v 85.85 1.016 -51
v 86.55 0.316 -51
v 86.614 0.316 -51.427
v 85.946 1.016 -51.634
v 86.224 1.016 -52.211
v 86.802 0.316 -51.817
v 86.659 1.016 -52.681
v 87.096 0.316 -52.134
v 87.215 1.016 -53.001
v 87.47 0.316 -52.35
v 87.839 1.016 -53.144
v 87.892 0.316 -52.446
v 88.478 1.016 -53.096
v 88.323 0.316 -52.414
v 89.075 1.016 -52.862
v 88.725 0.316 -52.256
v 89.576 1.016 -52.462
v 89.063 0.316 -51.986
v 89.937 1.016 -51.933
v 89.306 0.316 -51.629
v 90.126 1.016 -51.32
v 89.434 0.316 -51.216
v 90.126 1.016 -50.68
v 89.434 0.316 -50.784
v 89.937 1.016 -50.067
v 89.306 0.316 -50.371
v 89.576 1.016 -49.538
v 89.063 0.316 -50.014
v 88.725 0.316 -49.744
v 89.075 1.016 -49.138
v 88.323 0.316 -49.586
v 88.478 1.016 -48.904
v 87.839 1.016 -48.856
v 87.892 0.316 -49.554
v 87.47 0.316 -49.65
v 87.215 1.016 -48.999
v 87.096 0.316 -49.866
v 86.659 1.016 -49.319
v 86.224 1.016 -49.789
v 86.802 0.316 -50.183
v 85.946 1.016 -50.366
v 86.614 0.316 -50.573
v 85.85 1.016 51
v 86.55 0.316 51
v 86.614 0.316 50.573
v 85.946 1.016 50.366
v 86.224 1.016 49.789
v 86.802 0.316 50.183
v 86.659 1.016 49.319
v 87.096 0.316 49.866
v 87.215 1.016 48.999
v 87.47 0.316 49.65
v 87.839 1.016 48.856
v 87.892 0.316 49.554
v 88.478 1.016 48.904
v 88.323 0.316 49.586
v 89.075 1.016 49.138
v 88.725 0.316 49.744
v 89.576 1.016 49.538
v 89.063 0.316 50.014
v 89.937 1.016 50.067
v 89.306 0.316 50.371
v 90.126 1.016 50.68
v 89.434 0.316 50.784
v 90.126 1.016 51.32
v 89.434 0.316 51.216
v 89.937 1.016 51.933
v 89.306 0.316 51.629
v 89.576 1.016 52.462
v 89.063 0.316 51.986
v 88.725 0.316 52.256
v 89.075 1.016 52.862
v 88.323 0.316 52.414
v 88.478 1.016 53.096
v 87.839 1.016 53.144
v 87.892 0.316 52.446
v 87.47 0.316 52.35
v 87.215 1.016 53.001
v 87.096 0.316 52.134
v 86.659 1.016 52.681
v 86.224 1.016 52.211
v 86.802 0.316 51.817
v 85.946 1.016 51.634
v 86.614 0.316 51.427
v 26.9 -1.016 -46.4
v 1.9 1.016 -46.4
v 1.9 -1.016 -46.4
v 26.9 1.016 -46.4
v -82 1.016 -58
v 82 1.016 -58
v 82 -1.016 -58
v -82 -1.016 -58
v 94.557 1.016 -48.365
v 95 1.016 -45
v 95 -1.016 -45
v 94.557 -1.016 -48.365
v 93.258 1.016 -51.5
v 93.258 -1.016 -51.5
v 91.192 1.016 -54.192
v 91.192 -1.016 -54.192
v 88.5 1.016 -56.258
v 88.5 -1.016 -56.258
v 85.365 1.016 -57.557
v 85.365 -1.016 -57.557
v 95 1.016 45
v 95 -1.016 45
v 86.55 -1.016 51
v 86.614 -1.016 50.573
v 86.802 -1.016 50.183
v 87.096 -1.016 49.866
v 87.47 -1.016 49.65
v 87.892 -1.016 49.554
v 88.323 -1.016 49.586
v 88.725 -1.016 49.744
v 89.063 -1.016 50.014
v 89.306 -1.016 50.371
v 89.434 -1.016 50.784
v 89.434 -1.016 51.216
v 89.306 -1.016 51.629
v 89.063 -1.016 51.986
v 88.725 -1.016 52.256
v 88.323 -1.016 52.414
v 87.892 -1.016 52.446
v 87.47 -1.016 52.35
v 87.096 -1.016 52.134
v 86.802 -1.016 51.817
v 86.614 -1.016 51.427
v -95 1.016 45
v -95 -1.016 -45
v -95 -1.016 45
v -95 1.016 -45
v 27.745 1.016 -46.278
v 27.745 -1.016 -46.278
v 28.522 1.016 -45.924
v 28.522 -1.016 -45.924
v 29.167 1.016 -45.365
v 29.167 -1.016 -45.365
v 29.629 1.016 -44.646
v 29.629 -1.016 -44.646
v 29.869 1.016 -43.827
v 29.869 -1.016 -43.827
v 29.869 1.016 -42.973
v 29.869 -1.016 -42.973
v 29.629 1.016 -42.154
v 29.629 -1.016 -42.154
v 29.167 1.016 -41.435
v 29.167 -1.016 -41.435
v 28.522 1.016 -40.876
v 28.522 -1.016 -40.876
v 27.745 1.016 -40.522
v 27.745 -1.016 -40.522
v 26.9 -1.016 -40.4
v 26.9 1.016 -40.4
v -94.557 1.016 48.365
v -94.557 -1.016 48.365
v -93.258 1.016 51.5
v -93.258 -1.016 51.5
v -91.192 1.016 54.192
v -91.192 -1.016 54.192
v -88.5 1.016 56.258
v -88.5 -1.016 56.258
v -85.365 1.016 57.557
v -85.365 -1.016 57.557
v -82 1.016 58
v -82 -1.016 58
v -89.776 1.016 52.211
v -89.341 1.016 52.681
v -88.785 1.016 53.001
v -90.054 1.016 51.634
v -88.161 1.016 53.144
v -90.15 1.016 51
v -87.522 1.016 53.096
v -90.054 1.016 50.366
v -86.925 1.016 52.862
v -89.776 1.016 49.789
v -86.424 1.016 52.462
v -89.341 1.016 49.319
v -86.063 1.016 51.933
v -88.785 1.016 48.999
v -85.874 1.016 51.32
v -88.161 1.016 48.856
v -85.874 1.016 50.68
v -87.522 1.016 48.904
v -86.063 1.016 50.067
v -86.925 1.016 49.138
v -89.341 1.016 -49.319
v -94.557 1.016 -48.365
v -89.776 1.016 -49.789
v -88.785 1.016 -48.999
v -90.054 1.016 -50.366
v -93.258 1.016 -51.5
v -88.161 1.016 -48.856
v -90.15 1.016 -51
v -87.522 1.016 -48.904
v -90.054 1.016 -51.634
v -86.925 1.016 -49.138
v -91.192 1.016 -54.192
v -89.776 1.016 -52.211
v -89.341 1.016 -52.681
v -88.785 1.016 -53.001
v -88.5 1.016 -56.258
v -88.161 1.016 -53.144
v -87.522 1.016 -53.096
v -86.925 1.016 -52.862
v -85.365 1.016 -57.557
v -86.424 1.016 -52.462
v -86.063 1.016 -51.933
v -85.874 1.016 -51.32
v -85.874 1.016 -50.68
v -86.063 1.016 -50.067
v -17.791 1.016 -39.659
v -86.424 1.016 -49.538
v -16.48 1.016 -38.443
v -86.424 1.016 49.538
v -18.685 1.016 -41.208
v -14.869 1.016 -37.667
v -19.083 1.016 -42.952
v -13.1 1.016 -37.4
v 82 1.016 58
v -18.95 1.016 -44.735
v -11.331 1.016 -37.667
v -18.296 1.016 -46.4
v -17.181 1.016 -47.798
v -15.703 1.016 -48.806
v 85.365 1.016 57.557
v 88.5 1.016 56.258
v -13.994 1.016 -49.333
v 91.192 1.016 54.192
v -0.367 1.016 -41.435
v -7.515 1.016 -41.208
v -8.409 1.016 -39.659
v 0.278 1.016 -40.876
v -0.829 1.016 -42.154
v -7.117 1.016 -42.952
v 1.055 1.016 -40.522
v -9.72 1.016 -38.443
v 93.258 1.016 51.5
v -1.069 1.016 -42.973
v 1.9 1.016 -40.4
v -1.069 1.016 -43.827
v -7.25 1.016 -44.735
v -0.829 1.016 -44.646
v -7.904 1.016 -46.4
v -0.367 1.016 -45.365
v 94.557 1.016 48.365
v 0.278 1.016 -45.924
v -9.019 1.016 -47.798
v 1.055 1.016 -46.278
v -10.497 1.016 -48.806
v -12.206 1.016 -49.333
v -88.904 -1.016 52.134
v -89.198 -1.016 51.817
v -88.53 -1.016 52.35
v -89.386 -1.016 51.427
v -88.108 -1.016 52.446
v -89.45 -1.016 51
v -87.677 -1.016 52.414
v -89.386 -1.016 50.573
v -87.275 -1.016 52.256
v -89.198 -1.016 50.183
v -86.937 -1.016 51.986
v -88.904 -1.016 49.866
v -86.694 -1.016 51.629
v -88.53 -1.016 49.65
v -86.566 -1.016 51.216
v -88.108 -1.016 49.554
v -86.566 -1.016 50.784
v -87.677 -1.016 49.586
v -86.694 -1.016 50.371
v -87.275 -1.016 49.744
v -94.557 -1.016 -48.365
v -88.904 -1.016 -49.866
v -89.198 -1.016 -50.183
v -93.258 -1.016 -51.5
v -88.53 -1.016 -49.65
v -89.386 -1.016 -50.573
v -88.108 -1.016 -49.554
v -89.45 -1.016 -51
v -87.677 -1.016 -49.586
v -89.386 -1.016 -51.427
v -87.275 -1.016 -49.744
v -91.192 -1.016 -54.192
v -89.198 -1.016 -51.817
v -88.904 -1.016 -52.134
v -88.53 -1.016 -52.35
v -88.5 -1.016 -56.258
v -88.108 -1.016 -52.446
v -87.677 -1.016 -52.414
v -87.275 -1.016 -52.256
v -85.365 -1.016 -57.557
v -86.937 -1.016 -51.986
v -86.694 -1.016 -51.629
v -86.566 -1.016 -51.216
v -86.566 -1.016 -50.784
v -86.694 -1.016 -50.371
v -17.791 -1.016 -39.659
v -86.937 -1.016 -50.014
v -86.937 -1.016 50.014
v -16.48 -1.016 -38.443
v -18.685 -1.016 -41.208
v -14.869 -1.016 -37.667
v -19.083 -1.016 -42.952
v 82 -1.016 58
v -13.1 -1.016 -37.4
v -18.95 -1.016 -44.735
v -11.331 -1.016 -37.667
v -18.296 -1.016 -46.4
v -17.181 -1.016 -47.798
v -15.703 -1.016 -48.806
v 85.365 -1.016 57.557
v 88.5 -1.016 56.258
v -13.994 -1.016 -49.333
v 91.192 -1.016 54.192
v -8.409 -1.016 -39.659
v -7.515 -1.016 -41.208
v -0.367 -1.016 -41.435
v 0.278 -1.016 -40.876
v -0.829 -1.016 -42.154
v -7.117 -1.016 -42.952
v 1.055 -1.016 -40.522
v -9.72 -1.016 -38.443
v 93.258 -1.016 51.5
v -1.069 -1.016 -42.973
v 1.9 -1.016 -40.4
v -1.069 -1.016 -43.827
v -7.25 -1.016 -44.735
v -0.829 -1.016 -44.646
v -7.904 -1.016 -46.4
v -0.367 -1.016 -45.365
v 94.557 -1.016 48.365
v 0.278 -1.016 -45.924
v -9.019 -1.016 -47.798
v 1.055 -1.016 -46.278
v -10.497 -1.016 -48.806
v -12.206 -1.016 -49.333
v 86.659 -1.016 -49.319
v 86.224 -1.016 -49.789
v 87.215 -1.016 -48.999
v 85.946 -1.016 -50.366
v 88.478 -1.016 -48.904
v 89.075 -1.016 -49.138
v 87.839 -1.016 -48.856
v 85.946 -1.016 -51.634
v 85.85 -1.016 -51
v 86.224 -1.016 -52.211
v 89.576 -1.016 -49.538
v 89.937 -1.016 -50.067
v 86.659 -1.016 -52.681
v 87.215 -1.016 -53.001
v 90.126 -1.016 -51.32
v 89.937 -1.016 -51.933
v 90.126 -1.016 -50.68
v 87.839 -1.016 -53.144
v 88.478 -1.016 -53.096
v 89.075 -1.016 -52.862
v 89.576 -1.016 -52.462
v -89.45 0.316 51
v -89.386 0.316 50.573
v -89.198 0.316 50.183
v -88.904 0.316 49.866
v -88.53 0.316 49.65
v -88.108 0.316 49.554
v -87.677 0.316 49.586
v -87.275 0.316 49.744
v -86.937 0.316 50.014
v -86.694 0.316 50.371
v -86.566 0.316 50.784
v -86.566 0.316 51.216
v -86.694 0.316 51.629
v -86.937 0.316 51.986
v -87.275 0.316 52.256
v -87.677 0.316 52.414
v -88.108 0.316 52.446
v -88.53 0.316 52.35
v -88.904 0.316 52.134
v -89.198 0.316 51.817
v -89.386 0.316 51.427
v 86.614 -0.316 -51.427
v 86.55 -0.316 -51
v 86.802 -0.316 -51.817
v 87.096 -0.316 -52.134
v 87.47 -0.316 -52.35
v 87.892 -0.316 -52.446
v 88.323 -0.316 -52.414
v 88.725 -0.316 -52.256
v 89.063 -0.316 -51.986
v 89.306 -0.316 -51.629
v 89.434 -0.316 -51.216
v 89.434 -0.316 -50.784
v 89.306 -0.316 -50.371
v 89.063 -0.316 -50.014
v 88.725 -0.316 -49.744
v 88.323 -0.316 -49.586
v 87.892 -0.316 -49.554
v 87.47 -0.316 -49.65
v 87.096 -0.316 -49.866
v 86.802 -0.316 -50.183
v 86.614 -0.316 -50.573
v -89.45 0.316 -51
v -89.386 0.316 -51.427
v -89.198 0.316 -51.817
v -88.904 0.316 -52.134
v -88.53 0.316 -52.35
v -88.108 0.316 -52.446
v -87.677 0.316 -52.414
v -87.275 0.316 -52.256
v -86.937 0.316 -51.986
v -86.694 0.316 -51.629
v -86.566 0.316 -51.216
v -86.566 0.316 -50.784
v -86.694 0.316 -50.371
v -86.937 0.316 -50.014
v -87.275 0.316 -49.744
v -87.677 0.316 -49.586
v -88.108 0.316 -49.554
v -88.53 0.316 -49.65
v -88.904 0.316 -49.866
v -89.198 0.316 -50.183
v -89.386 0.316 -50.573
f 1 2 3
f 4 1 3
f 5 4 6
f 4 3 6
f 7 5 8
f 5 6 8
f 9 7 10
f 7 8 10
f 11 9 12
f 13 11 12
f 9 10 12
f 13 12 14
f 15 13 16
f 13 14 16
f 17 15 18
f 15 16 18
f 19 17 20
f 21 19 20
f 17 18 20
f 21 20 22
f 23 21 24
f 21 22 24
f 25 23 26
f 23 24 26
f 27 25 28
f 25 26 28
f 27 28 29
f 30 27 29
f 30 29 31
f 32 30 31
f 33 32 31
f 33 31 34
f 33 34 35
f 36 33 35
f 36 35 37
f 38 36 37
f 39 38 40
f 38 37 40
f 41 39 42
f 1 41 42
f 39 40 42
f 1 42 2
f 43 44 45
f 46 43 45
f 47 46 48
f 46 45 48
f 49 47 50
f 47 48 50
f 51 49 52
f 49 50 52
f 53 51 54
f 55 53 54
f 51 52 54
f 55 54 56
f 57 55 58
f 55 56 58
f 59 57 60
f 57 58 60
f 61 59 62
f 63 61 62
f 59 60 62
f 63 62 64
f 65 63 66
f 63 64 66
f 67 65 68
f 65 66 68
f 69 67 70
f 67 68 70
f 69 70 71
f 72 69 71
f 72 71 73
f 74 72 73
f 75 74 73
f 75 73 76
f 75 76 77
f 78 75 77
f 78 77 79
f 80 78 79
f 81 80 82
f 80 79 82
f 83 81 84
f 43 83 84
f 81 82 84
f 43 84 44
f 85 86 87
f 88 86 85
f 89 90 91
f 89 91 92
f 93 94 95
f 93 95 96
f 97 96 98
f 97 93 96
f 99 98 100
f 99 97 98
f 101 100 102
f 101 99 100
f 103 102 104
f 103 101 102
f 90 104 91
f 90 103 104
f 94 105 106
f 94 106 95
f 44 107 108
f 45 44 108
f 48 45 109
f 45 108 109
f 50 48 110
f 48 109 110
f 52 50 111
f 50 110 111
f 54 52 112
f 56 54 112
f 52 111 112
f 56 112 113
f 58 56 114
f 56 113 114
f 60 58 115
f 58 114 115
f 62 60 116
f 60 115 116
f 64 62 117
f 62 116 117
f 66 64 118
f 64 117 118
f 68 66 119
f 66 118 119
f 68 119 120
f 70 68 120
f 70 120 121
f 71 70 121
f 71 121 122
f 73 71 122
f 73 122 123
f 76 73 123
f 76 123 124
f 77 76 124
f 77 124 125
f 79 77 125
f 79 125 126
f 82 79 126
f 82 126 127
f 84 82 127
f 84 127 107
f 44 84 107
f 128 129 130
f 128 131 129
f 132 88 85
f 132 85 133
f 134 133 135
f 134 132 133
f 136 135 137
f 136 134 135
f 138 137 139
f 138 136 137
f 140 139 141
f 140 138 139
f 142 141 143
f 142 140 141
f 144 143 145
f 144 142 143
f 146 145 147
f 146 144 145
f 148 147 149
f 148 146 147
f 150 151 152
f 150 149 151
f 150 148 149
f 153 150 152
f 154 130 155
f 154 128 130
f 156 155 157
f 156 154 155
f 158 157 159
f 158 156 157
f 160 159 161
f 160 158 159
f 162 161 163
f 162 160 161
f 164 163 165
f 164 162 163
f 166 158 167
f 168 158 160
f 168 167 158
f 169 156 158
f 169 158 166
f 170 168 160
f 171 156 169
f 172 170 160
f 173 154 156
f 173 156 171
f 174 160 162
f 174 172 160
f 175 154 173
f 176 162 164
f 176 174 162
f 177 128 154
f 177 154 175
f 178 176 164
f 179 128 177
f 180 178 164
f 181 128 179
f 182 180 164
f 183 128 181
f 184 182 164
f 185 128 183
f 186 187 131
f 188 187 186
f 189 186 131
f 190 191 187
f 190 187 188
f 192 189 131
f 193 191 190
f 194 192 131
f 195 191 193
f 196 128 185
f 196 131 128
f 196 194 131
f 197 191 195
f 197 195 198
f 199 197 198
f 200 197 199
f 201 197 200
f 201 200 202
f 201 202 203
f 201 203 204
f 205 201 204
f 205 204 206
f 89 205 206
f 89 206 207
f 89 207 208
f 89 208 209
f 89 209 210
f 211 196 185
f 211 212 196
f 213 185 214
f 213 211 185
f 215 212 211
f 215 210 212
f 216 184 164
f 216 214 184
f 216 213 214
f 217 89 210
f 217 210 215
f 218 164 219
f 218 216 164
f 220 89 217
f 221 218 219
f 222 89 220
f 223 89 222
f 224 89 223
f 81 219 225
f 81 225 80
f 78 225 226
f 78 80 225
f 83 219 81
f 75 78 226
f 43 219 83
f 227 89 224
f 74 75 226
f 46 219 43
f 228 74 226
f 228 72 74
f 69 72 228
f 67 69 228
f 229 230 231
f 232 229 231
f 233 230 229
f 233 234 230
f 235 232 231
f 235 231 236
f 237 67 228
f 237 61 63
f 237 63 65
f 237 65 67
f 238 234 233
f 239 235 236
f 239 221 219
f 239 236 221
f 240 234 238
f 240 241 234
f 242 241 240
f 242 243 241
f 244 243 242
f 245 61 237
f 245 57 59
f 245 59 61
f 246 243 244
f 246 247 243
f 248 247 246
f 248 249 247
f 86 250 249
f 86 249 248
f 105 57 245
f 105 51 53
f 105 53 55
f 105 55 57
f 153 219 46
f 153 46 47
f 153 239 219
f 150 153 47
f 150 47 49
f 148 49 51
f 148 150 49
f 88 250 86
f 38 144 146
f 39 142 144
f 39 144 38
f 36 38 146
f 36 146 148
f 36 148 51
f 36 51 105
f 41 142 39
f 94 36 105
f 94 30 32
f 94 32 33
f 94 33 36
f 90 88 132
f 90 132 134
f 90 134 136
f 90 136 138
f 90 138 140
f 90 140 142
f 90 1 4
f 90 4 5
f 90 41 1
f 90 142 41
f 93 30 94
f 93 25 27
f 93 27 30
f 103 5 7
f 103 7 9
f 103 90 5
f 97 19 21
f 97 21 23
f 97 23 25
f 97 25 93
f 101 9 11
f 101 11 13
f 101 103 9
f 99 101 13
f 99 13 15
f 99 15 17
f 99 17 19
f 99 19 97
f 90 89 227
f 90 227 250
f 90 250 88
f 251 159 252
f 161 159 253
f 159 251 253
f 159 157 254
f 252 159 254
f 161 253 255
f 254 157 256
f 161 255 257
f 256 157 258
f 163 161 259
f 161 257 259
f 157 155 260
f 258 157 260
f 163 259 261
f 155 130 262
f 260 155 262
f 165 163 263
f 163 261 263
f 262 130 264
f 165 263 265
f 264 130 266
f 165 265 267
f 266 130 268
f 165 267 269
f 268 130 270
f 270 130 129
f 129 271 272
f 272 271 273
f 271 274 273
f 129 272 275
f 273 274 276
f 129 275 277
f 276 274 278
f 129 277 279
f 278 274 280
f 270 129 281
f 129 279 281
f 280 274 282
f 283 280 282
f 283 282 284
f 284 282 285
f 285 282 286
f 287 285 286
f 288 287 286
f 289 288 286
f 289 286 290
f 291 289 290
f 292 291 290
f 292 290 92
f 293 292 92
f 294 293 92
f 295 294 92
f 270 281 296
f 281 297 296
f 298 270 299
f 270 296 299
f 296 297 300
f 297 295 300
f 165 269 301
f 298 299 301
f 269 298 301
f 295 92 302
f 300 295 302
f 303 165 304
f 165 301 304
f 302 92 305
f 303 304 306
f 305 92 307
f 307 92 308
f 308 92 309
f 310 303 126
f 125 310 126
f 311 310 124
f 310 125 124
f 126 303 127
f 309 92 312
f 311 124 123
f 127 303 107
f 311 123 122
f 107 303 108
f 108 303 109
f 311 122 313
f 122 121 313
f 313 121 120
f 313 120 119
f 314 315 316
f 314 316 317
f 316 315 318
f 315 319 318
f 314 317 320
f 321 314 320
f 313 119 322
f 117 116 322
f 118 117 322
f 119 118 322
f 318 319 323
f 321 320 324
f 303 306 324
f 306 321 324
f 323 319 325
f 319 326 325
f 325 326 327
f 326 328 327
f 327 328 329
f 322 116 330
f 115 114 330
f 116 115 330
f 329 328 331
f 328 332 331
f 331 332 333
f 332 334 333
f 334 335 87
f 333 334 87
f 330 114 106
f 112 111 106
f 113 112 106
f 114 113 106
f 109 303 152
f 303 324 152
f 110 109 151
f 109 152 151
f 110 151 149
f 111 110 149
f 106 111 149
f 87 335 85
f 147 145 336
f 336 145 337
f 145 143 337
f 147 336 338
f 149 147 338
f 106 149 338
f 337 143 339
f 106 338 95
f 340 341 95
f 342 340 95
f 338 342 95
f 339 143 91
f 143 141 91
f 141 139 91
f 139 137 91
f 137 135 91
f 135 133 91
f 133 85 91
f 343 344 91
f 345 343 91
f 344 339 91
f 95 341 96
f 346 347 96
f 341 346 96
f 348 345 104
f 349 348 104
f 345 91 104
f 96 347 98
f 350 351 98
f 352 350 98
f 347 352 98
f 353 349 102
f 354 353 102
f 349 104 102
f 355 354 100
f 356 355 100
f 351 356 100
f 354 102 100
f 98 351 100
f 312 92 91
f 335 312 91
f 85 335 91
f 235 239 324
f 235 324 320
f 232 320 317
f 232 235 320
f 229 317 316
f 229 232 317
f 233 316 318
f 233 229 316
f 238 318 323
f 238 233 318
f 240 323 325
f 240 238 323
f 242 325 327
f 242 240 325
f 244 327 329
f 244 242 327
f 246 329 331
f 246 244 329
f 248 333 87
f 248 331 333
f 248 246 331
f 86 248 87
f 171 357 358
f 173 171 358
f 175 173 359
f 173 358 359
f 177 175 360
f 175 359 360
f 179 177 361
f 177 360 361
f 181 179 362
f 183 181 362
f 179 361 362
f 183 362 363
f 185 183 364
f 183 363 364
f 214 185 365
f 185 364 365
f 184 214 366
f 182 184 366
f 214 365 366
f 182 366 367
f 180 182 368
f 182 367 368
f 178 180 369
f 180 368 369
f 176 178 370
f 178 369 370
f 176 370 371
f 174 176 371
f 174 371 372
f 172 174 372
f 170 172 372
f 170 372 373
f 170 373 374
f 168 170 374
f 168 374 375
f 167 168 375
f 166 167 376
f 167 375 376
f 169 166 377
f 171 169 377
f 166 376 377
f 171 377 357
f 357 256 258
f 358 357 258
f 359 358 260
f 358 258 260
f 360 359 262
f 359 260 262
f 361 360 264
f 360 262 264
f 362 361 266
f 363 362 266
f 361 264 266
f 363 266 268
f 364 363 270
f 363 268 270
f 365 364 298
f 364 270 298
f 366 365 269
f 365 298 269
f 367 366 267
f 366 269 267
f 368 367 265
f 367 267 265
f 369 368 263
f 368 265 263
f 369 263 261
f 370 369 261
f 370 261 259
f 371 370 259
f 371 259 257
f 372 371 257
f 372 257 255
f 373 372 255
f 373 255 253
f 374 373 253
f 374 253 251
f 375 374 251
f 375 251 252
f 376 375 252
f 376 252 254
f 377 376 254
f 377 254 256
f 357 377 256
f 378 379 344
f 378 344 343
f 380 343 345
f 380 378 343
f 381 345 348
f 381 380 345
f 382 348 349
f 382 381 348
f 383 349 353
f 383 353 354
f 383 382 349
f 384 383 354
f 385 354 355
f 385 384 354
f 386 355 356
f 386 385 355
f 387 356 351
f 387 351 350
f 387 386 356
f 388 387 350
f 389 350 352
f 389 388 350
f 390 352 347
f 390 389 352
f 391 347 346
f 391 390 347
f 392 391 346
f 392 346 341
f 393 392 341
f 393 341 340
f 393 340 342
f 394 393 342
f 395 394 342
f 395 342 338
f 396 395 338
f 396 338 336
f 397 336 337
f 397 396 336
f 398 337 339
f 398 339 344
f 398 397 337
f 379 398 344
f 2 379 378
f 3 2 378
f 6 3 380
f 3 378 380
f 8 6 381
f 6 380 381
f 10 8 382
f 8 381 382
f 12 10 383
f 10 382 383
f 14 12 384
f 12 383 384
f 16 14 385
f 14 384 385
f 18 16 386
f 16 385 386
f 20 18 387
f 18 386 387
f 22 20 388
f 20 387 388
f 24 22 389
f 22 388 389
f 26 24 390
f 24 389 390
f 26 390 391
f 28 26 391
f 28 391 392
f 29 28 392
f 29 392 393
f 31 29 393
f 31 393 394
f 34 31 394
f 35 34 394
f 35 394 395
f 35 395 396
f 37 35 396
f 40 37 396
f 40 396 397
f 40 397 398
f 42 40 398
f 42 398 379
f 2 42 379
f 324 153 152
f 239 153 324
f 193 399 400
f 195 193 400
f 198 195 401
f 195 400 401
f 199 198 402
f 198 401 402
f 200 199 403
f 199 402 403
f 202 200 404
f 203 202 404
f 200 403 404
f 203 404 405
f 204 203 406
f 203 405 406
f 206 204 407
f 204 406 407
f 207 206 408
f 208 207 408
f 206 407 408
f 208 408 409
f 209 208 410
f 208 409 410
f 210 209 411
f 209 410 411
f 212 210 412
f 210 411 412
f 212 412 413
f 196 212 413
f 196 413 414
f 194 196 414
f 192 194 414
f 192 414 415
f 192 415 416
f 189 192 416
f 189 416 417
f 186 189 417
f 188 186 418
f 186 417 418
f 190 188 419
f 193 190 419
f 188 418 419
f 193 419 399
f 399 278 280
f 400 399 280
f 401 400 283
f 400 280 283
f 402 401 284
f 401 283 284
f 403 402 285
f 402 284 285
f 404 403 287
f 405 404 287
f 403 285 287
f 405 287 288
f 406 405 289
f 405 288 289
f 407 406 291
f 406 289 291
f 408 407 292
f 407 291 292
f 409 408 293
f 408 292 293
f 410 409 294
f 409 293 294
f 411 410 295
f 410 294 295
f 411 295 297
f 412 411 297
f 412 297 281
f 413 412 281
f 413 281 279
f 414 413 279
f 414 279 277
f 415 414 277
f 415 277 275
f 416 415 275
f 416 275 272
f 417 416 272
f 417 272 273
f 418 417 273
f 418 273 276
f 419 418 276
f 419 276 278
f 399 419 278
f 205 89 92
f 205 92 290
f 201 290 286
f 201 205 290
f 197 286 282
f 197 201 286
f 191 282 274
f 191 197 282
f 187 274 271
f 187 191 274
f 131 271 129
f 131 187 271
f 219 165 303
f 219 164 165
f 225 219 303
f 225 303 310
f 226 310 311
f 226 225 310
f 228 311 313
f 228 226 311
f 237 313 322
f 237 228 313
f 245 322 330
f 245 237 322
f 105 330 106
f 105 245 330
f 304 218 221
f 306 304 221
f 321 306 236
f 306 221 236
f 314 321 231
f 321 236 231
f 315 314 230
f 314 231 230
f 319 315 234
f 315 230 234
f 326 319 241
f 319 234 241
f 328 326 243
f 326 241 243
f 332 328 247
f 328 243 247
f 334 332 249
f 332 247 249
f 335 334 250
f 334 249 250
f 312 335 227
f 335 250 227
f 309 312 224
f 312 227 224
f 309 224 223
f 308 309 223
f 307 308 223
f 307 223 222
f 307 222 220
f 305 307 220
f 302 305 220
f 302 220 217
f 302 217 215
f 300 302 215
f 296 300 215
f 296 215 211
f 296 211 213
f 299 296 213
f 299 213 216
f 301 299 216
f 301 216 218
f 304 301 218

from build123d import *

# Parameters (mm, degrees)
BOSS_EXTRUDE1_DEPTH        = 1.016
F_2_9_2_9_DIAMETER_HOLE1_D = 2.9
CHAMFER1_SIZE              = 0.7
SKETCH4_R                  = 6
CUT_EXTRUDE1_DEPTH         = 112.324431389
CUT_EXTRUDE2_DEPTH         = 112.324431389


with BuildPart() as part:
    # Sketch1 → Boss-Extrude1 (new, symmetric)
    with BuildSketch(Plane(origin=(0, 0, 0), x_dir=(1, 0, 0), z_dir=(0, 1, 0))):
        with BuildLine():
            Line((-82, -58), (82, -58))
            ThreePointArc((82, -58), (91.192388155, -54.192388155), (95, -45))
            Line((95, -45), (95, 45))
            ThreePointArc((95, 45), (91.192388155, 54.192388155), (82, 58))
            Line((82, 58), (-82, 58))
            ThreePointArc((-82, 58), (-91.192388155, 54.192388155), (-95, 45))
            Line((-95, 45), (-95, -45))
            ThreePointArc((-95, -45), (-91.192388155, -54.192388155), (-82, -58))
        make_face()
    extrude(amount=BOSS_EXTRUDE1_DEPTH, both=True)

    # Ø2.9 (2.9) Diameter Hole1 (through all)
    with Locations(Plane(origin=(0, 1.016, 0), x_dir=(1, 0, 0), z_dir=(0, 1, 0))):
        with Locations((-88, -51), (-88, 51), (88, -51), (88, 51)):
            Hole(F_2_9_2_9_DIAMETER_HOLE1_D / 2)

    # Chamfer1
    chamfer1_edges = [part.edges().sort_by_distance(p)[0] for p in [
        (89.45, 1.016, -51),
        (89.45, -1.016, -51),
        (89.45, 1.016, 51),
        (-86.55, 1.016, -51),
        (-86.55, 1.016, 51),
    ]]
    chamfer(chamfer1_edges, length=CHAMFER1_SIZE)

    # Sketch4 → Cut-Extrude1 (cut, through all)
    with BuildSketch(Plane(origin=(0, 1.016, 0), x_dir=(1, 0, 0), z_dir=(0, 1, 0))):
        with Locations(Location((-13.1, 43.4, 0), (0, 0, 270))):
            Circle(SKETCH4_R)
    extrude(amount=-CUT_EXTRUDE1_DEPTH, mode=Mode.SUBTRACT)

    # Sketch5 → Cut-Extrude2 (cut, through all)
    with BuildSketch(Plane(origin=(0, 1.016, 0), x_dir=(1, 0, 0), z_dir=(0, 1, 0))):
        with BuildLine():
            Line((1.9, 46.4), (26.9, 46.4))
            ThreePointArc((26.9, 46.4), (29.9, 43.4), (26.9, 40.4))
            Line((26.9, 40.4), (1.9, 40.4))
            ThreePointArc((1.9, 40.4), (-1.1, 43.4), (1.9, 46.4))
        make_face()
    extrude(amount=-CUT_EXTRUDE2_DEPTH, mode=Mode.SUBTRACT)


solid = part.part
